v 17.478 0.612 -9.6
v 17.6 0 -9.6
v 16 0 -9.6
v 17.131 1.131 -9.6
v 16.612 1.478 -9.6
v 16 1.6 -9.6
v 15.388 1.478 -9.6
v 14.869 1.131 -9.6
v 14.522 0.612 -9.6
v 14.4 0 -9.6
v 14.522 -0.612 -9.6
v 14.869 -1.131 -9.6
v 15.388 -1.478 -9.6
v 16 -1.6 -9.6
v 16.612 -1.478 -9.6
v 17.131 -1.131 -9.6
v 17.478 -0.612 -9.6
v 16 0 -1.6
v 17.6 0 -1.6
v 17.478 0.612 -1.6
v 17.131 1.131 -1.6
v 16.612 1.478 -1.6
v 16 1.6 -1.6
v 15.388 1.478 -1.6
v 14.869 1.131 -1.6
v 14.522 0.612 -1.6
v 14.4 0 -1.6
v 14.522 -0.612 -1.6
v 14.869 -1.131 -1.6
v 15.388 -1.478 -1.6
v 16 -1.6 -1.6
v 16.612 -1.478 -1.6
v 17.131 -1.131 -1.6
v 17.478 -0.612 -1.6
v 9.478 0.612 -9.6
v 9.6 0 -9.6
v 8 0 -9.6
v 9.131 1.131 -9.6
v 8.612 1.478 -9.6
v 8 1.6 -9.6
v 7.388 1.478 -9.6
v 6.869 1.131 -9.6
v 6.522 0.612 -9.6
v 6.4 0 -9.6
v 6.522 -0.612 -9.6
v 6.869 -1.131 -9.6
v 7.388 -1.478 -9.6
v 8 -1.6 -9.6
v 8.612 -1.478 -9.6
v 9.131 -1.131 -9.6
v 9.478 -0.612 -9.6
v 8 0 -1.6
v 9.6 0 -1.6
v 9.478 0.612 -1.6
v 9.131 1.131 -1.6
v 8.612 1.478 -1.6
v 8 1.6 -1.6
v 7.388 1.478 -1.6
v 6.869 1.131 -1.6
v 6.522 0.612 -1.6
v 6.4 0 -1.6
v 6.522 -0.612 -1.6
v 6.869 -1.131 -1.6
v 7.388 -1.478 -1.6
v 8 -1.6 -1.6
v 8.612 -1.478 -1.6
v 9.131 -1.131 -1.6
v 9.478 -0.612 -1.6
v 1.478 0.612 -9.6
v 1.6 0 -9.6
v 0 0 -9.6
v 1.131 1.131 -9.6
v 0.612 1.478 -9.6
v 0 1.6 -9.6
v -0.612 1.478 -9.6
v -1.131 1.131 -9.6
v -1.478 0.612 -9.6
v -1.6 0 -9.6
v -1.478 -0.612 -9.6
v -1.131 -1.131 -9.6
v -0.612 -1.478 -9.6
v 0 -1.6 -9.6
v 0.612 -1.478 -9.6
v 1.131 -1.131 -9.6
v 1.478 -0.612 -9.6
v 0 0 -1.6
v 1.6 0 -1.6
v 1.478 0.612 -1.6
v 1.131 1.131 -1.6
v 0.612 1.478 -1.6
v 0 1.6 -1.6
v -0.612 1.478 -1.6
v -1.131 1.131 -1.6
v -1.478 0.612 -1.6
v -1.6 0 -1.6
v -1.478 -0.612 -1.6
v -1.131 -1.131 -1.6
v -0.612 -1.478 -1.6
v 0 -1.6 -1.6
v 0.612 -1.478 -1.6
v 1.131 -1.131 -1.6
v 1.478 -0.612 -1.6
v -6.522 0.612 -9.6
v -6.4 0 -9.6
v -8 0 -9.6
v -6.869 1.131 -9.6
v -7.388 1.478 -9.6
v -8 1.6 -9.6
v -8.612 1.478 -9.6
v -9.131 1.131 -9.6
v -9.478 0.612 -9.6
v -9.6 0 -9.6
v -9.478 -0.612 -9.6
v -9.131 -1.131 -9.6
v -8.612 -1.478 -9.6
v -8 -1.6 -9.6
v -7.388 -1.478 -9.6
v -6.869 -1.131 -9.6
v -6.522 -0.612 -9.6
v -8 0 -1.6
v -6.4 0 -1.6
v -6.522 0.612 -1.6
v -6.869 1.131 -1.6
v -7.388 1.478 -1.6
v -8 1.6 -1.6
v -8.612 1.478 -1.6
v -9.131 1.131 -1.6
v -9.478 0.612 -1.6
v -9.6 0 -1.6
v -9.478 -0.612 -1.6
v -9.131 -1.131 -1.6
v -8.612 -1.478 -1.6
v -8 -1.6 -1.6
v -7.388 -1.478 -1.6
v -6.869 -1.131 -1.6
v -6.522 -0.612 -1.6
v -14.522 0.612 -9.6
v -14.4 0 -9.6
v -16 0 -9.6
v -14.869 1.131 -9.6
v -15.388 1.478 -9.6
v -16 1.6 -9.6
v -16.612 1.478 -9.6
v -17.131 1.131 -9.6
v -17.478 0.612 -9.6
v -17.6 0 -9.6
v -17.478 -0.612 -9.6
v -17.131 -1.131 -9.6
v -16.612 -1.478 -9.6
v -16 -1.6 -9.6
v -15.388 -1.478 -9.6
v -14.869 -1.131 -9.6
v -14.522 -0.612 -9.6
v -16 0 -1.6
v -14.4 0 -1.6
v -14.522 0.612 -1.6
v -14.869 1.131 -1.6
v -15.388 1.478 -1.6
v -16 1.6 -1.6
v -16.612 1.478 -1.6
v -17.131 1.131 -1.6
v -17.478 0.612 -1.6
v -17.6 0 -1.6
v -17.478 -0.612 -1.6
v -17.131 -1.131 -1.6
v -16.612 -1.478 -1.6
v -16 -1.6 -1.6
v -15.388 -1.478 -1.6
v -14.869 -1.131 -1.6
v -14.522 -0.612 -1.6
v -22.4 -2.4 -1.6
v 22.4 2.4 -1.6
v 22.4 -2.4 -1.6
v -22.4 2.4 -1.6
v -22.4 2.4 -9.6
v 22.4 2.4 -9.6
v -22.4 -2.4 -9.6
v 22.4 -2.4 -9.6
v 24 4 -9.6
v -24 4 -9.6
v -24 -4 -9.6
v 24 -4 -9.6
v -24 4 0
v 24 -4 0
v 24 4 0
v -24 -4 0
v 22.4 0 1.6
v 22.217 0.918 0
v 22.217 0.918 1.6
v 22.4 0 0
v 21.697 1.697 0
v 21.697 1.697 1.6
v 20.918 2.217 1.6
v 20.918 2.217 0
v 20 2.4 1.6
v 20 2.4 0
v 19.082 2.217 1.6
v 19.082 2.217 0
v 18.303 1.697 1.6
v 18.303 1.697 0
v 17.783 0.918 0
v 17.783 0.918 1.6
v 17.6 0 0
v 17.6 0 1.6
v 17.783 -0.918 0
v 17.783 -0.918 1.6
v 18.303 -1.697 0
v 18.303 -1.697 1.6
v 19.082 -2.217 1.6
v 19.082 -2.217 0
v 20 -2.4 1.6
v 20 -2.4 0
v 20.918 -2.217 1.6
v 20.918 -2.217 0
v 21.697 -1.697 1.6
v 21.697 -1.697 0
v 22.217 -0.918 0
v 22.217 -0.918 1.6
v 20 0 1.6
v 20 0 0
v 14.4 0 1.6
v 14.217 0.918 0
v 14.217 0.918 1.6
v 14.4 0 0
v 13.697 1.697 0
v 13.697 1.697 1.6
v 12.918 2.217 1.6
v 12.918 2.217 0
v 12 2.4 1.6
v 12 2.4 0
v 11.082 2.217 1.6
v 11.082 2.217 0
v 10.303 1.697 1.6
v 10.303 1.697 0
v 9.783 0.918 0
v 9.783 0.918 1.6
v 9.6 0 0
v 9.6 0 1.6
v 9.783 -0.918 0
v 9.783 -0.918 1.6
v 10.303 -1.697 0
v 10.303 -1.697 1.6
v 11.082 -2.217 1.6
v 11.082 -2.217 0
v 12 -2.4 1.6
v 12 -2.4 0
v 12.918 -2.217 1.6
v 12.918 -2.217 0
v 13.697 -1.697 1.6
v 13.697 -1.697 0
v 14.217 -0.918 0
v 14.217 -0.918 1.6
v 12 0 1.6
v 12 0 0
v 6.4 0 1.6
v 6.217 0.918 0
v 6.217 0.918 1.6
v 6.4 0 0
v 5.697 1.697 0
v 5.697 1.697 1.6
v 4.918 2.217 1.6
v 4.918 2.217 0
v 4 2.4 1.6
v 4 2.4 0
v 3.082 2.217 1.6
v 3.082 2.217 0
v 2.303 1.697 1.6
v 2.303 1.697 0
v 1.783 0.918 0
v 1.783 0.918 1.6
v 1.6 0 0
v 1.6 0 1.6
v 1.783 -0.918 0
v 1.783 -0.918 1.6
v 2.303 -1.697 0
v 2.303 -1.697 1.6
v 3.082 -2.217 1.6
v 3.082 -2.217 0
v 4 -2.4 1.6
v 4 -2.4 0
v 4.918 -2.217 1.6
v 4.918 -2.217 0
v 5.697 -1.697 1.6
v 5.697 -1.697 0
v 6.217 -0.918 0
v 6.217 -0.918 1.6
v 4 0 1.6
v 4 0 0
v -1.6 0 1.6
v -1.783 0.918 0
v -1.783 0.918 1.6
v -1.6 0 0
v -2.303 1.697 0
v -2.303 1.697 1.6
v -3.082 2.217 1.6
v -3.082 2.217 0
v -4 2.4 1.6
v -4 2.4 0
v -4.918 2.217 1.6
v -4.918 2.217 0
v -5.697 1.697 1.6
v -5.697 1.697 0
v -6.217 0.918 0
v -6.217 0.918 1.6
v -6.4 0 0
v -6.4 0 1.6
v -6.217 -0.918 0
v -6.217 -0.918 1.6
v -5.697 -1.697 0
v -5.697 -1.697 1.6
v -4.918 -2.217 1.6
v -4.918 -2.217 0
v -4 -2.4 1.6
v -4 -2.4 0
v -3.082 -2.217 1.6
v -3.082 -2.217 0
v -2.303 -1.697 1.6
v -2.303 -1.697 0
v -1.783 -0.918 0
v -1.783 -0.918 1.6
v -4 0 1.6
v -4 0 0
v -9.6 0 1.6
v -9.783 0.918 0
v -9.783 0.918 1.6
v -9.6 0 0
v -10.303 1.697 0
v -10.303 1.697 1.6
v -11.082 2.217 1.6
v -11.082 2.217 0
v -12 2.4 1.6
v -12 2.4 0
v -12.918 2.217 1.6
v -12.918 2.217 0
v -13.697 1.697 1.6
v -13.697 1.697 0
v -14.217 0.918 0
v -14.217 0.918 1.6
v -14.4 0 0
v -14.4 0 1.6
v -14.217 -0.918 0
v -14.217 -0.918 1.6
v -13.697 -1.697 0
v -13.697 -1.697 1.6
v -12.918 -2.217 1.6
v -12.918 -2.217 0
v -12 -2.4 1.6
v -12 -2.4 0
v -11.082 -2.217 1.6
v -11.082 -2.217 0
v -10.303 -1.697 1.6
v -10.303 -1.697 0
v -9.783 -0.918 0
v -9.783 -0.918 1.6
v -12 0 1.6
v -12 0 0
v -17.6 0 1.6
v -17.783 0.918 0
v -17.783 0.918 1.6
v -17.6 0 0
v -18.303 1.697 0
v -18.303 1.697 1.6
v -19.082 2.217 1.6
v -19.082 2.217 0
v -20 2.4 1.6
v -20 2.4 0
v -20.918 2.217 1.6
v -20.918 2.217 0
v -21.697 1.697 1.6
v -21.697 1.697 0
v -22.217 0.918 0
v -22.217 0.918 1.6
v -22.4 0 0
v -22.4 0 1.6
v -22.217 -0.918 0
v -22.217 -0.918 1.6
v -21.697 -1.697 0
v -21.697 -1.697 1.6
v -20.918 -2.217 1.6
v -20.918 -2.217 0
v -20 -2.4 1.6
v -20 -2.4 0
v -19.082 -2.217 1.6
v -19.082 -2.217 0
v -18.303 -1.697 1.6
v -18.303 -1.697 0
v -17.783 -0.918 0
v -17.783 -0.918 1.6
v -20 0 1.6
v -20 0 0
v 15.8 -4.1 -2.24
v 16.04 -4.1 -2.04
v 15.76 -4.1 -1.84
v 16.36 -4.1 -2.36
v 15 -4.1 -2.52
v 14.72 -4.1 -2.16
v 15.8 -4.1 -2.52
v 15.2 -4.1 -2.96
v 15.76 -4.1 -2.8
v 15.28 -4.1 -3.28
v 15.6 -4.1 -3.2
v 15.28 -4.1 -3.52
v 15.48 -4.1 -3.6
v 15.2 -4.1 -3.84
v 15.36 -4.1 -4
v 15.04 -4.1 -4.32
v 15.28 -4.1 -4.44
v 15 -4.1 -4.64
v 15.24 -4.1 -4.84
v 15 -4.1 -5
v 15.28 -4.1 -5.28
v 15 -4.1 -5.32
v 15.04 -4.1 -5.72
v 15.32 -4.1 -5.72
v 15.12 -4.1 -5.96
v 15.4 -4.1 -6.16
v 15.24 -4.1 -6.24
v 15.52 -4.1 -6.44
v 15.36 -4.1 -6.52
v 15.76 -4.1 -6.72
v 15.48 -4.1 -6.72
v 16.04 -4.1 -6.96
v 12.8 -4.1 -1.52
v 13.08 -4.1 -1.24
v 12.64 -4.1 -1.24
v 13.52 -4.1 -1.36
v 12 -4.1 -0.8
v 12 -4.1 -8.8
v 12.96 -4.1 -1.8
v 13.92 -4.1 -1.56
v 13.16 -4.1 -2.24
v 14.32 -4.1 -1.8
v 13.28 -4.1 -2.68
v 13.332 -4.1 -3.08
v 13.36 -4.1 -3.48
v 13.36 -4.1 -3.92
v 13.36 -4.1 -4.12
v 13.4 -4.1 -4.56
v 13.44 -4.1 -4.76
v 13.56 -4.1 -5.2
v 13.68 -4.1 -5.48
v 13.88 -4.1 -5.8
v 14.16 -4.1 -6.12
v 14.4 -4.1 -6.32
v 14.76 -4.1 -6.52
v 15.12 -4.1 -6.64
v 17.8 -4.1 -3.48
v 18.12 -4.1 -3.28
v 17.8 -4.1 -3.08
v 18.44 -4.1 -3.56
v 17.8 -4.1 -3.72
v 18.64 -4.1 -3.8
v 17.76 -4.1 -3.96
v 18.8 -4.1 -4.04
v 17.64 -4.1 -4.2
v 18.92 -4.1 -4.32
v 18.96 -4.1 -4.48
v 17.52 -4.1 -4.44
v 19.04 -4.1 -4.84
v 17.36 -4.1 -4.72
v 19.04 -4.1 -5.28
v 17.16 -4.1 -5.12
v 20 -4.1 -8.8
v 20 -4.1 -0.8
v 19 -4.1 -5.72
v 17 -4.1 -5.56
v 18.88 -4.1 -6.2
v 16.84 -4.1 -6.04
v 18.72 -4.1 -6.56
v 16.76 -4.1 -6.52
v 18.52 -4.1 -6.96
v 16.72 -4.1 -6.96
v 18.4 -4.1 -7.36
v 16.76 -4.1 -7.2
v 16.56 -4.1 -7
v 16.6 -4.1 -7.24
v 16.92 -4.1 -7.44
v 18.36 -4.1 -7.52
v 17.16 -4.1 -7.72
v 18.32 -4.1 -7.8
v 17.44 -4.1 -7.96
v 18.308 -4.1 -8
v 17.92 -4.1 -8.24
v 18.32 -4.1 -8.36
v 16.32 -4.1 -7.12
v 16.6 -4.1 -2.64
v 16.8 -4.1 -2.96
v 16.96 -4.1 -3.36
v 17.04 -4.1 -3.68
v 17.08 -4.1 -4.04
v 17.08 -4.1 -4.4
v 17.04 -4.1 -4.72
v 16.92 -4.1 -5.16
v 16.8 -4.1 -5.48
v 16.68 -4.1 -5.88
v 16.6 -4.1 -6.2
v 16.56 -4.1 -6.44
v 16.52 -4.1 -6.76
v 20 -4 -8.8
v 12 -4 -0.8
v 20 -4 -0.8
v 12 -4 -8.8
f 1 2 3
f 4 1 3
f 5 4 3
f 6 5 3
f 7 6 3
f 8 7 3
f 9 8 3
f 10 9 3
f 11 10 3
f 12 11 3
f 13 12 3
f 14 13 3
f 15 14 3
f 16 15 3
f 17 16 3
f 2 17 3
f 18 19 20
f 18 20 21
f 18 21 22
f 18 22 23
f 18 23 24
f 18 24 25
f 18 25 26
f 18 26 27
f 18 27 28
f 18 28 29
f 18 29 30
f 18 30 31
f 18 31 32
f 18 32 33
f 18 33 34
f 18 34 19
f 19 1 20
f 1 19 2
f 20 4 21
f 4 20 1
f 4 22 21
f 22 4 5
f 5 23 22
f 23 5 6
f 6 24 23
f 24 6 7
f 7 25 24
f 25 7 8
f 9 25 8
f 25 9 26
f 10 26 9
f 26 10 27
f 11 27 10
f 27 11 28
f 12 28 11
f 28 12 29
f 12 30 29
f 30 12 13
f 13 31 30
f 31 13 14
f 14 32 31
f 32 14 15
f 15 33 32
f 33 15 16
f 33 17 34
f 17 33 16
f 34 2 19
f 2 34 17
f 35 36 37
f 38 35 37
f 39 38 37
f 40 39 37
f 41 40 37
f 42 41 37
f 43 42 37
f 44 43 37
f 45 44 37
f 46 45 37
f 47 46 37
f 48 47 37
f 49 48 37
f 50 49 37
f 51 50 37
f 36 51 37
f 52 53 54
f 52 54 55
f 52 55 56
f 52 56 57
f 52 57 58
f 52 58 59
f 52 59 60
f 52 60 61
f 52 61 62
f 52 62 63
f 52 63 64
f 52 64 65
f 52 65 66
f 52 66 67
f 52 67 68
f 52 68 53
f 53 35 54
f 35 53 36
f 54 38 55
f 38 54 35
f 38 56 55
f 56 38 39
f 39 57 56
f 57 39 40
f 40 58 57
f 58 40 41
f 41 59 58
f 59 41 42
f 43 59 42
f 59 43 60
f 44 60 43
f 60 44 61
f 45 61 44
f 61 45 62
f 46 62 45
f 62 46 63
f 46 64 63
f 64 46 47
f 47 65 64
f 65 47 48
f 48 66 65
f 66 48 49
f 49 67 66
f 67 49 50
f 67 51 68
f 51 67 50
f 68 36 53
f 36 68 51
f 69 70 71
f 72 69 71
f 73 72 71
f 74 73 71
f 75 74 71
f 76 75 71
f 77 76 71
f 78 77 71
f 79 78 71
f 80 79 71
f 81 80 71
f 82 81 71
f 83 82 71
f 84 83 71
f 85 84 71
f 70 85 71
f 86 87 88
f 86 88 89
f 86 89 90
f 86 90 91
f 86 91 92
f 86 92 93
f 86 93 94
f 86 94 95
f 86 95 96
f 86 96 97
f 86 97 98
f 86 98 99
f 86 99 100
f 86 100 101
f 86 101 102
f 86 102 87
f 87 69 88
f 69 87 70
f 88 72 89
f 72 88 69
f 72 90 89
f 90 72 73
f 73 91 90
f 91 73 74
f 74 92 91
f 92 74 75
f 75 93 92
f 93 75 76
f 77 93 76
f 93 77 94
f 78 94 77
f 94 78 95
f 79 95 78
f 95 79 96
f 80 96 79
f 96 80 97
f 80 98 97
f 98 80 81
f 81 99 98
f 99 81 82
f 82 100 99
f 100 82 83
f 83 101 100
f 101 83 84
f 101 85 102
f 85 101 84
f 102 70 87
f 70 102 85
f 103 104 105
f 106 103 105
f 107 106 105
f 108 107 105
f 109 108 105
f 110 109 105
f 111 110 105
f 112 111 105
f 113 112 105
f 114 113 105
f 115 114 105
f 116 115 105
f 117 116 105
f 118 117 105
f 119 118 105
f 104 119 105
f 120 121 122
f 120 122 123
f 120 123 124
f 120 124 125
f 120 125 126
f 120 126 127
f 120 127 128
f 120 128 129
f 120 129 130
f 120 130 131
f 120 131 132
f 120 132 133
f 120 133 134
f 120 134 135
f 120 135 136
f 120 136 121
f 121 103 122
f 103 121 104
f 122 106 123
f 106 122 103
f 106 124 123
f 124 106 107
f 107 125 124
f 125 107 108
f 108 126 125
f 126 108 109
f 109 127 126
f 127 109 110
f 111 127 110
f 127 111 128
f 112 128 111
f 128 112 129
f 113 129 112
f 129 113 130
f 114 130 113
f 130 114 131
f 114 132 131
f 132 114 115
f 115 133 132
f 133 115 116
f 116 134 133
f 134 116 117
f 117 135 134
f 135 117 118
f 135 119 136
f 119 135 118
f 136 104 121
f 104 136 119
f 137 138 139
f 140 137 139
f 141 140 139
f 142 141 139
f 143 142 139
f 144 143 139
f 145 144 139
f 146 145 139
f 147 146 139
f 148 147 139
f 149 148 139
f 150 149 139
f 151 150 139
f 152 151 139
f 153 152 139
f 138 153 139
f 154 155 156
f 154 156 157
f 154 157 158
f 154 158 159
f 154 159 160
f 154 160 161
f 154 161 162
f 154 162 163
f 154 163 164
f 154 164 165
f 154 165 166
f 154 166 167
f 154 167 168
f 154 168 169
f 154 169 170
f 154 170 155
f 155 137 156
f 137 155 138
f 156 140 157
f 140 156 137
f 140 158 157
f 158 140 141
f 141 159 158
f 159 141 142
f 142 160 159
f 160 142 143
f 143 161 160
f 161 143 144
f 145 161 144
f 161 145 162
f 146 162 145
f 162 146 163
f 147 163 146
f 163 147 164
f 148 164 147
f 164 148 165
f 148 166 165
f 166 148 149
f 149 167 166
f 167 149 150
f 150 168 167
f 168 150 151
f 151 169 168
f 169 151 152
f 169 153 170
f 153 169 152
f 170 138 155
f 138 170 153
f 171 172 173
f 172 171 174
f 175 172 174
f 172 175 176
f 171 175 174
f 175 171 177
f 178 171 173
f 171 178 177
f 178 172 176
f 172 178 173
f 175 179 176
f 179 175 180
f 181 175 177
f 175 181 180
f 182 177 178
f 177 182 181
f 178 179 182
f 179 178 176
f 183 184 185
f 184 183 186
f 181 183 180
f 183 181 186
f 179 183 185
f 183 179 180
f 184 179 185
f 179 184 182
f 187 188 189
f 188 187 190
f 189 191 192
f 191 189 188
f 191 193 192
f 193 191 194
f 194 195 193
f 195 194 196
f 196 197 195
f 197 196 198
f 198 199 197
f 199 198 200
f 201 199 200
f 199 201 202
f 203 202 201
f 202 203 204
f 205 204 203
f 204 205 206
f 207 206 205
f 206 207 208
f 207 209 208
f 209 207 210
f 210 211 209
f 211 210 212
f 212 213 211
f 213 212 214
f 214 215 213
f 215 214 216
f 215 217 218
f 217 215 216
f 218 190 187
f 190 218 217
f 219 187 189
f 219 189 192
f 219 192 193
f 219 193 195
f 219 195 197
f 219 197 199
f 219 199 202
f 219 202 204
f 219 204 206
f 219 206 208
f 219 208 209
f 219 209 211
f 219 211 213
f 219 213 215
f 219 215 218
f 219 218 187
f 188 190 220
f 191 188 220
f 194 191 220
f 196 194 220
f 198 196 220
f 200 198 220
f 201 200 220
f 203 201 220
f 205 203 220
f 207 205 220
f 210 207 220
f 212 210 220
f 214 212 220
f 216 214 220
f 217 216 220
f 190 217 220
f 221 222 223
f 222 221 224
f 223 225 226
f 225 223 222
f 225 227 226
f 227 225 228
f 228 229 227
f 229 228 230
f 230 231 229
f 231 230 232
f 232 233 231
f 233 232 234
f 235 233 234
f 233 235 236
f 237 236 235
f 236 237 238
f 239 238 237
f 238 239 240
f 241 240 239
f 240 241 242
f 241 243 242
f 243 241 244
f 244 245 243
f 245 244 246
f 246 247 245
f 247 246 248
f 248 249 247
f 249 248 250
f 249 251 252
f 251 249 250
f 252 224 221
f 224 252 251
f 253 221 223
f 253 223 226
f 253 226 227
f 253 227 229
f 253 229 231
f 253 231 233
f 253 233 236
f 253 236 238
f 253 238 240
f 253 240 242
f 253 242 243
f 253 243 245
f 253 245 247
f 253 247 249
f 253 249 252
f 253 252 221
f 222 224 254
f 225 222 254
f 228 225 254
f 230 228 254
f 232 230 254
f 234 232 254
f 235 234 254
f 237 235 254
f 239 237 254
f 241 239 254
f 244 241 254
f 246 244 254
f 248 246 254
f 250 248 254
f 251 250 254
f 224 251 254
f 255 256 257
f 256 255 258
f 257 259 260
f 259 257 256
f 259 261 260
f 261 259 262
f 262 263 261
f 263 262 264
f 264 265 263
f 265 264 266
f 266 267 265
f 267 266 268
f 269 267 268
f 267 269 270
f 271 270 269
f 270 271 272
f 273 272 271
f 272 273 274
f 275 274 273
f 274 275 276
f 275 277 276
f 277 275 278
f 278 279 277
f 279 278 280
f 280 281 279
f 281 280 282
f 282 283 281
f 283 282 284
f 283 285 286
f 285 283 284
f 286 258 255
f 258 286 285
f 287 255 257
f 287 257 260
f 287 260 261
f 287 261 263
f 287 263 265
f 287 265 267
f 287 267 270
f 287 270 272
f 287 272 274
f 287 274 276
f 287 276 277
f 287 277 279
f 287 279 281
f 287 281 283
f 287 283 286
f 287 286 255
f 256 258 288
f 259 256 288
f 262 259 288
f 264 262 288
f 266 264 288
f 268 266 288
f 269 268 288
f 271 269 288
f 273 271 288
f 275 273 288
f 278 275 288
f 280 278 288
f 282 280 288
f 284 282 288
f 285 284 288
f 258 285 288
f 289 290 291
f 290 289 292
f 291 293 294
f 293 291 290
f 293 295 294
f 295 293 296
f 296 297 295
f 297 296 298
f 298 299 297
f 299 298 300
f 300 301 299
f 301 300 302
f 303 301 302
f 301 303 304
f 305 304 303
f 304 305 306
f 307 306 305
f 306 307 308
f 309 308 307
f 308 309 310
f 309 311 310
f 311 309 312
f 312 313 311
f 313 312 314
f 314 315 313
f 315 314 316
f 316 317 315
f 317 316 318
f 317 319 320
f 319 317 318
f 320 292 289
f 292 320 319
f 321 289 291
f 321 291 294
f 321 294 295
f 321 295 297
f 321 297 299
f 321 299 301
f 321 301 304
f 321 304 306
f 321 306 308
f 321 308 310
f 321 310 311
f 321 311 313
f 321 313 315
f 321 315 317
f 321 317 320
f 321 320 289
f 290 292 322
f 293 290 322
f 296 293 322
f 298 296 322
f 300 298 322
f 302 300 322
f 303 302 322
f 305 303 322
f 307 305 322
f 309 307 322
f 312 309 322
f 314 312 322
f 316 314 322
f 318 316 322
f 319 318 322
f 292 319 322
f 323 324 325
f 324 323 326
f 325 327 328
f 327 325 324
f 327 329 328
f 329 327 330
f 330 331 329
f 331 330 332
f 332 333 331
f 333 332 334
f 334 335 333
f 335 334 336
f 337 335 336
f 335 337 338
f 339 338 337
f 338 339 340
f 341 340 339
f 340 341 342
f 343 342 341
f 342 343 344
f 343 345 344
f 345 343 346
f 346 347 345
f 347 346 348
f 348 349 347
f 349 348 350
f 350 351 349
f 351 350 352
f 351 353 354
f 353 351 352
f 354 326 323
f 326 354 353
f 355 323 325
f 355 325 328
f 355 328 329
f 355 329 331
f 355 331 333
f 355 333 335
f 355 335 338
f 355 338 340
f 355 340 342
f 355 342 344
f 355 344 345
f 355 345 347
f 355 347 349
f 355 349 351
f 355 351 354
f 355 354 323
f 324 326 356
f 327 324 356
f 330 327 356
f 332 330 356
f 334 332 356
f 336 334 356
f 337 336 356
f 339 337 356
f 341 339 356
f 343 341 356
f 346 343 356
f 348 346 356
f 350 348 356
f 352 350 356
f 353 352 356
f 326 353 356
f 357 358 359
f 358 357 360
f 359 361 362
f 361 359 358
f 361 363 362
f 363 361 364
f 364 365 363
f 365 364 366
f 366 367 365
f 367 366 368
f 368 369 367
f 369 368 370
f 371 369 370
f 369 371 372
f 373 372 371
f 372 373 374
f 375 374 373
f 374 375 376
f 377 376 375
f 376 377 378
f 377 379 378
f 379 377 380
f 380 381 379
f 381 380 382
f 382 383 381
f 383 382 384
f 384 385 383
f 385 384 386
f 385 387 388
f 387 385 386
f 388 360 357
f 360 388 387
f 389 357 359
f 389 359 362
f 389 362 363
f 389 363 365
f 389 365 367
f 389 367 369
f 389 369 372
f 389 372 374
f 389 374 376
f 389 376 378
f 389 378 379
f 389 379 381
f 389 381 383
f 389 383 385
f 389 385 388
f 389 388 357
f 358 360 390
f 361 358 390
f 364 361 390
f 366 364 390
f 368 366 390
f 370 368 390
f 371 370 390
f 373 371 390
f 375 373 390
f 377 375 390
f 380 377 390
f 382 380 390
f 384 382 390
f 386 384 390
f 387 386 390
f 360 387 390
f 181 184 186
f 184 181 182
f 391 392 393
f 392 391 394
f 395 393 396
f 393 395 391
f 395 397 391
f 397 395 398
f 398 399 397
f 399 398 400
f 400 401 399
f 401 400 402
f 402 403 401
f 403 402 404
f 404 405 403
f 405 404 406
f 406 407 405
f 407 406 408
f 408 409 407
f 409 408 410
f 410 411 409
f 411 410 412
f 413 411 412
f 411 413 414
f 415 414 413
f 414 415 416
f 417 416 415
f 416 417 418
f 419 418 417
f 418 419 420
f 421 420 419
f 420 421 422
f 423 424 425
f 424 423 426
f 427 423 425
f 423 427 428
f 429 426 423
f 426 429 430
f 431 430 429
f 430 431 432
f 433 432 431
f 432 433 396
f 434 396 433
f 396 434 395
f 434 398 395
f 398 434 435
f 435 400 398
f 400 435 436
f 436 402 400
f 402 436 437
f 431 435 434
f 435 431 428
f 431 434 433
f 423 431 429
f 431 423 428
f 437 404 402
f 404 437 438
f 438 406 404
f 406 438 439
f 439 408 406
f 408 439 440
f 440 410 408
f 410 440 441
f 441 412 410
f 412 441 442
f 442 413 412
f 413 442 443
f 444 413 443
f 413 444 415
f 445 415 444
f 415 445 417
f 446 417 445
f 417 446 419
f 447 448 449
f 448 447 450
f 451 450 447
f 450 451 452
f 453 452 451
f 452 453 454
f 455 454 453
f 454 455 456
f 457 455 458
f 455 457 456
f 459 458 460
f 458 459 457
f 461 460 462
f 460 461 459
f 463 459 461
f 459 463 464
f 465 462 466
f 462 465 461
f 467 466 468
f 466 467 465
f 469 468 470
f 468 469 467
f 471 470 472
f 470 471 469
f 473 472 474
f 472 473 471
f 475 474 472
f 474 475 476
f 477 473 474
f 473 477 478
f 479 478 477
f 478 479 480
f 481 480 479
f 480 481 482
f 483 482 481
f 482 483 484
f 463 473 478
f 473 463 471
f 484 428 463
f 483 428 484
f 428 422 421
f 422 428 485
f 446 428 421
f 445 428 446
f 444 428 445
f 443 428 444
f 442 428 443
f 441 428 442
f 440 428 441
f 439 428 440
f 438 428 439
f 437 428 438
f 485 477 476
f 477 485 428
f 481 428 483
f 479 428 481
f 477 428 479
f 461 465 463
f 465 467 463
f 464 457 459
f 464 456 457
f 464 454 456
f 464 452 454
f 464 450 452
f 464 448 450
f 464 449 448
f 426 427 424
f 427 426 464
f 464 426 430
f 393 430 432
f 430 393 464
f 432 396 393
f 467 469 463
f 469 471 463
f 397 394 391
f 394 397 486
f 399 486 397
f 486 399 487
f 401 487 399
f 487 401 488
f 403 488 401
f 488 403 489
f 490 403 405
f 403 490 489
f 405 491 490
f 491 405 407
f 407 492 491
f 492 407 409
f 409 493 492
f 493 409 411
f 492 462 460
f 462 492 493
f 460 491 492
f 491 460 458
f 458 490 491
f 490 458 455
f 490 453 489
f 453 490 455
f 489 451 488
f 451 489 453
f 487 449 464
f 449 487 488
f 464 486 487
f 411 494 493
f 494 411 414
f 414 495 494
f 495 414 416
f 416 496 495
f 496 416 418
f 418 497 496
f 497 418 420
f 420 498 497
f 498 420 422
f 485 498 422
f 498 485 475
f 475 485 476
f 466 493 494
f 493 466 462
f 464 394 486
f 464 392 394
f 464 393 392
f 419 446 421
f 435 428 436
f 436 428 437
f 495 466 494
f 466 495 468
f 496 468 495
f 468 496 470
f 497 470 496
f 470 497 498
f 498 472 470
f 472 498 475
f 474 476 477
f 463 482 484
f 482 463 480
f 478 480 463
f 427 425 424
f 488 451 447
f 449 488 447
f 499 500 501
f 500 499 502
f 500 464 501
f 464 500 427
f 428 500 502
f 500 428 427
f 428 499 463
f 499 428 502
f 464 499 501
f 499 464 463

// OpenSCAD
// file: ../p/4-4edge.scad
use <../lib.scad>
function ldraw_lib__4_4edge() = [
// 0 Circle 1.0
// 0 Name: 4-4edge.dat
// 0 Author: James Jessiman
// 0 !LDRAW_ORG Primitive UPDATE 2017-01
// 0 !LICENSE Licensed under CC BY 2.0 and CC BY 4.0 : see CAreadme.txt
// 
// 0 BFC CERTIFY CCW
  [0,"BFC","CERTIFY"],
  [0,"BFC","CCW"],
// 
// 0 !HISTORY 1998-12-15 [PTadmin] Official Update 1998-10
// 0 !HISTORY 2005-12-28 [PTadmin] Official Update 2005-01
// 0 !HISTORY 2007-06-24 [PTadmin] Header formatted for Contributor Agreement
// 0 !HISTORY 2008-07-01 [PTadmin] Official Update 2008-01
// 0 !HISTORY 2017-01-15 [Steffen] BFCed
// 0 !HISTORY 2017-12-30 [PTadmin] Official Update 2017-01
// 
// 
// 2 24 1 0 0 0.9239 0 0.3827
  [2,24,1,0,0,0.9239,0,0.3827],
// 2 24 0.9239 0 0.3827 0.7071 0 0.7071
  [2,24,0.9239,0,0.3827,0.7071,0,0.7071],
// 2 24 0.7071 0 0.7071 0.3827 0 0.9239
  [2,24,0.7071,0,0.7071,0.3827,0,0.9239],
// 2 24 0.3827 0 0.9239 0 0 1
  [2,24,0.3827,0,0.9239,0,0,1],
// 2 24 0 0 1 -0.3827 0 0.9239
  [2,24,0,0,1,-0.3827,0,0.9239],
// 2 24 -0.3827 0 0.9239 -0.7071 0 0.7071
  [2,24,-0.3827,0,0.9239,-0.7071,0,0.7071],
// 2 24 -0.7071 0 0.7071 -0.9239 0 0.3827
  [2,24,-0.7071,0,0.7071,-0.9239,0,0.3827],
// 2 24 -0.9239 0 0.3827 -1 0 -0
  [2,24,-0.9239,0,0.3827,-1,0,-0],
// 2 24 -1 0 -0 -0.9239 0 -0.3827
  [2,24,-1,0,-0,-0.9239,0,-0.3827],
// 2 24 -0.9239 0 -0.3827 -0.7071 0 -0.7071
  [2,24,-0.9239,0,-0.3827,-0.7071,0,-0.7071],
// 2 24 -0.7071 0 -0.7071 -0.3827 0 -0.9239
  [2,24,-0.7071,0,-0.7071,-0.3827,0,-0.9239],
// 2 24 -0.3827 0 -0.9239 0 0 -1
  [2,24,-0.3827,0,-0.9239,0,0,-1],
// 2 24 0 0 -1 0.3827 0 -0.9239
  [2,24,0,0,-1,0.3827,0,-0.9239],
// 2 24 0.3827 0 -0.9239 0.7071 0 -0.7071
  [2,24,0.3827,0,-0.9239,0.7071,0,-0.7071],
// 2 24 0.7071 0 -0.7071 0.9239 0 -0.3827
  [2,24,0.7071,0,-0.7071,0.9239,0,-0.3827],
// 2 24 0.9239 0 -0.3827 1 0 0
  [2,24,0.9239,0,-0.3827,1,0,0],
];
module ldraw_lib__4_4edge(step=0, col=false, unit=2/5, alt=false, line=0.2, solid=!$preview)
    makepoly(ldraw_lib__4_4edge(), step=step, col=col, unit=unit, alt=alt, line=line, solid=solid);
ldraw_lib__4_4edge(line=0.2);
// file: ../p/4-4disc.scad
use <../lib.scad>
function ldraw_lib__4_4disc() = [
// 0 Disc 1.0
// 0 Name: 4-4disc.dat
// 0 Author: James Jessiman
// 0 !LDRAW_ORG Primitive UPDATE 2002-02
// 0 !LICENSE Licensed under CC BY 2.0 and CC BY 4.0 : see CAreadme.txt
// 
// 0 BFC CERTIFY CCW
  [0,"BFC","CERTIFY"],
  [0,"BFC","CCW"],
// 
// 0 !HISTORY 1998-12-15 [PTadmin] Official Update 1998-10
// 0 !HISTORY 2002-03-23 [sbliss] Added BFC statement
// 0 !HISTORY 2002-04-25 [PTadmin] Official Update 2002-02
// 0 !HISTORY 2007-06-24 [PTadmin] Header formatted for Contributor Agreement
// 0 !HISTORY 2008-07-01 [PTadmin] Official Update 2008-01
// 
// 
// 3 16 0 0 0 1 0 0 0.9239 0 0.3827
  [3,16,0,0,0,1,0,0,0.9239,0,0.3827],
// 3 16 0 0 0 0.9239 0 0.3827 0.7071 0 0.7071
  [3,16,0,0,0,0.9239,0,0.3827,0.7071,0,0.7071],
// 3 16 0 0 0 0.7071 0 0.7071 0.3827 0 0.9239
  [3,16,0,0,0,0.7071,0,0.7071,0.3827,0,0.9239],
// 3 16 0 0 0 0.3827 0 0.9239 0 0 1
  [3,16,0,0,0,0.3827,0,0.9239,0,0,1],
// 3 16 0 0 0 0 0 1 -0.3827 0 0.9239
  [3,16,0,0,0,0,0,1,-0.3827,0,0.9239],
// 3 16 0 0 0 -0.3827 0 0.9239 -0.7071 0 0.7071
  [3,16,0,0,0,-0.3827,0,0.9239,-0.7071,0,0.7071],
// 3 16 0 0 0 -0.7071 0 0.7071 -0.9239 0 0.3827
  [3,16,0,0,0,-0.7071,0,0.7071,-0.9239,0,0.3827],
// 3 16 0 0 0 -0.9239 0 0.3827 -1 0 -0
  [3,16,0,0,0,-0.9239,0,0.3827,-1,0,-0],
// 3 16 0 0 0 -1 0 -0 -0.9239 0 -0.3827
  [3,16,0,0,0,-1,0,-0,-0.9239,0,-0.3827],
// 3 16 0 0 0 -0.9239 0 -0.3827 -0.7071 0 -0.7071
  [3,16,0,0,0,-0.9239,0,-0.3827,-0.7071,0,-0.7071],
// 3 16 0 0 0 -0.7071 0 -0.7071 -0.3827 0 -0.9239
  [3,16,0,0,0,-0.7071,0,-0.7071,-0.3827,0,-0.9239],
// 3 16 0 0 0 -0.3827 0 -0.9239 0 0 -1
  [3,16,0,0,0,-0.3827,0,-0.9239,0,0,-1],
// 3 16 0 0 0 0 0 -1 0.3827 0 -0.9239
  [3,16,0,0,0,0,0,-1,0.3827,0,-0.9239],
// 3 16 0 0 0 0.3827 0 -0.9239 0.7071 0 -0.7071
  [3,16,0,0,0,0.3827,0,-0.9239,0.7071,0,-0.7071],
// 3 16 0 0 0 0.7071 0 -0.7071 0.9239 0 -0.3827
  [3,16,0,0,0,0.7071,0,-0.7071,0.9239,0,-0.3827],
// 3 16 0 0 0 0.9239 0 -0.3827 1 0 0
  [3,16,0,0,0,0.9239,0,-0.3827,1,0,0],
// 0
];
module ldraw_lib__4_4disc(step=0, col=false, unit=2/5, alt=false, line=0.2, solid=!$preview)
    makepoly(ldraw_lib__4_4disc(), step=step, col=col, unit=unit, alt=alt, line=line, solid=solid);
ldraw_lib__4_4disc(line=0.2);
// file: ../p/4-4cyli.scad
use <../lib.scad>
$fa=1; $fs=0.2;
function ldraw_lib__4_4cyli(realsolid=false) = [
// 0 Cylinder 1.0
// 0 Name: 4-4cyli.dat
// 0 Author: James Jessiman
// 0 !LDRAW_ORG Primitive UPDATE 2005-01
// 0 !LICENSE Licensed under CC BY 2.0 and CC BY 4.0 : see CAreadme.txt
// 
// 0 BFC CERTIFY CCW
  [0,"BFC","CERTIFY"],
  [0,"BFC","CCW"],
// 
// 0 !HISTORY 1998-12-15 [PTadmin] Official Update 1998-10
// 0 !HISTORY 2002-03-23 [sbliss] Added BFC statement; merged headers from files in distributions LDraw 0.27 and Complete.
// 0 !HISTORY 2002-04-25 [PTadmin] Official Update 2002-02
// 0 !HISTORY 2004-12-14 [guyvivan] BFC CCW
// 0 !HISTORY 2005-12-28 [PTadmin] Official Update 2005-01
// 0 !HISTORY 2007-06-24 [PTadmin] Header formatted for Contributor Agreement
// 0 !HISTORY 2008-07-01 [PTadmin] Official Update 2008-01
// 
// 
// 4 16 1 1 0 0.9239 1 0.3827 0.9239 0 0.3827 1 0 0
  [4,16,1,1,0,0.9239,1,0.3827,0.9239,0,0.3827,1,0,0],
// 5 24 1 0 0 1 1 0 0.9239 0 0.3827 0.9239 0 -0.3827
  [5,24,1,0,0,1,1,0,0.9239,0,0.3827,0.9239,0,-0.3827],
// 4 16 0.9239 1 0.3827 0.7071 1 0.7071 0.7071 0 0.7071 0.9239 0 0.3827
  [4,16,0.9239,1,0.3827,0.7071,1,0.7071,0.7071,0,0.7071,0.9239,0,0.3827],
// 5 24 0.9239 0 0.3827 0.9239 1 0.3827 0.7071 0 0.7071 1 0 0
  [5,24,0.9239,0,0.3827,0.9239,1,0.3827,0.7071,0,0.7071,1,0,0],
// 4 16 0.7071 1 0.7071 0.3827 1 0.9239 0.3827 0 0.9239 0.7071 0 0.7071
  [4,16,0.7071,1,0.7071,0.3827,1,0.9239,0.3827,0,0.9239,0.7071,0,0.7071],
// 5 24 0.7071 0 0.7071 0.7071 1 0.7071 0.3827 0 0.9239 0.9239 0 0.3827
  [5,24,0.7071,0,0.7071,0.7071,1,0.7071,0.3827,0,0.9239,0.9239,0,0.3827],
// 4 16 0.3827 1 0.9239 0 1 1 0 0 1 0.3827 0 0.9239
  [4,16,0.3827,1,0.9239,0,1,1,0,0,1,0.3827,0,0.9239],
// 5 24 0.3827 0 0.9239 0.3827 1 0.9239 0 0 1 0.7071 0 0.7071
  [5,24,0.3827,0,0.9239,0.3827,1,0.9239,0,0,1,0.7071,0,0.7071],
// 4 16 0 1 1 -0.3827 1 0.9239 -0.3827 0 0.9239 0 0 1
  [4,16,0,1,1,-0.3827,1,0.9239,-0.3827,0,0.9239,0,0,1],
// 5 24 0 0 1 0 1 1 -0.3827 0 0.9239 0.3827 0 0.9239
  [5,24,0,0,1,0,1,1,-0.3827,0,0.9239,0.3827,0,0.9239],
// 4 16 -0.3827 1 0.9239 -0.7071 1 0.7071 -0.7071 0 0.7071 -0.3827 0 0.9239
  [4,16,-0.3827,1,0.9239,-0.7071,1,0.7071,-0.7071,0,0.7071,-0.3827,0,0.9239],
// 5 24 -0.3827 0 0.9239 -0.3827 1 0.9239 -0.7071 0 0.7071 0 0 1
  [5,24,-0.3827,0,0.9239,-0.3827,1,0.9239,-0.7071,0,0.7071,0,0,1],
// 4 16 -0.7071 1 0.7071 -0.9239 1 0.3827 -0.9239 0 0.3827 -0.7071 0 0.7071
  [4,16,-0.7071,1,0.7071,-0.9239,1,0.3827,-0.9239,0,0.3827,-0.7071,0,0.7071],
// 5 24 -0.7071 0 0.7071 -0.7071 1 0.7071 -0.9239 0 0.3827 -0.3827 0 0.9239
  [5,24,-0.7071,0,0.7071,-0.7071,1,0.7071,-0.9239,0,0.3827,-0.3827,0,0.9239],
// 4 16 -0.9239 1 0.3827 -1 1 0 -1 0 0 -0.9239 0 0.3827
  [4,16,-0.9239,1,0.3827,-1,1,0,-1,0,0,-0.9239,0,0.3827],
// 5 24 -0.9239 0 0.3827 -0.9239 1 0.3827 -1 0 0 -0.7071 0 0.7071
  [5,24,-0.9239,0,0.3827,-0.9239,1,0.3827,-1,0,0,-0.7071,0,0.7071],
// 4 16 -1 1 0 -0.9239 1 -0.3827 -0.9239 0 -0.3827 -1 0 0
  [4,16,-1,1,0,-0.9239,1,-0.3827,-0.9239,0,-0.3827,-1,0,0],
// 5 24 -1 0 0 -1 1 0 -0.9239 0 -0.3827 -0.9239 0 0.3827
  [5,24,-1,0,0,-1,1,0,-0.9239,0,-0.3827,-0.9239,0,0.3827],
// 4 16 -0.9239 1 -0.3827 -0.7071 1 -0.7071 -0.7071 0 -0.7071 -0.9239 0 -0.3827
  [4,16,-0.9239,1,-0.3827,-0.7071,1,-0.7071,-0.7071,0,-0.7071,-0.9239,0,-0.3827],
// 5 24 -0.9239 0 -0.3827 -0.9239 1 -0.3827 -0.7071 0 -0.7071 -1 0 0
  [5,24,-0.9239,0,-0.3827,-0.9239,1,-0.3827,-0.7071,0,-0.7071,-1,0,0],
// 4 16 -0.7071 1 -0.7071 -0.3827 1 -0.9239 -0.3827 0 -0.9239 -0.7071 0 -0.7071
  [4,16,-0.7071,1,-0.7071,-0.3827,1,-0.9239,-0.3827,0,-0.9239,-0.7071,0,-0.7071],
// 5 24 -0.7071 0 -0.7071 -0.7071 1 -0.7071 -0.3827 0 -0.9239 -0.9239 0 -0.3827
  [5,24,-0.7071,0,-0.7071,-0.7071,1,-0.7071,-0.3827,0,-0.9239,-0.9239,0,-0.3827],
// 4 16 -0.3827 1 -0.9239 0 1 -1 0 0 -1 -0.3827 0 -0.9239
  [4,16,-0.3827,1,-0.9239,0,1,-1,0,0,-1,-0.3827,0,-0.9239],
// 5 24 -0.3827 0 -0.9239 -0.3827 1 -0.9239 0 0 -1 -0.7071 0 -0.7071
  [5,24,-0.3827,0,-0.9239,-0.3827,1,-0.9239,0,0,-1,-0.7071,0,-0.7071],
// 4 16 0 1 -1 0.3827 1 -0.9239 0.3827 0 -0.9239 0 0 -1
  [4,16,0,1,-1,0.3827,1,-0.9239,0.3827,0,-0.9239,0,0,-1],
// 5 24 0 0 -1 0 1 -1 0.3827 0 -0.9239 -0.3827 0 -0.9239
  [5,24,0,0,-1,0,1,-1,0.3827,0,-0.9239,-0.3827,0,-0.9239],
// 4 16 0.3827 1 -0.9239 0.7071 1 -0.7071 0.7071 0 -0.7071 0.3827 0 -0.9239
  [4,16,0.3827,1,-0.9239,0.7071,1,-0.7071,0.7071,0,-0.7071,0.3827,0,-0.9239],
// 5 24 0.3827 0 -0.9239 0.3827 1 -0.9239 0.7071 0 -0.7071 0 0 -1
  [5,24,0.3827,0,-0.9239,0.3827,1,-0.9239,0.7071,0,-0.7071,0,0,-1],
// 4 16 0.7071 1 -0.7071 0.9239 1 -0.3827 0.9239 0 -0.3827 0.7071 0 -0.7071
  [4,16,0.7071,1,-0.7071,0.9239,1,-0.3827,0.9239,0,-0.3827,0.7071,0,-0.7071],
// 5 24 0.7071 0 -0.7071 0.7071 1 -0.7071 0.9239 0 -0.3827 0.3827 0 -0.9239
  [5,24,0.7071,0,-0.7071,0.7071,1,-0.7071,0.9239,0,-0.3827,0.3827,0,-0.9239],
// 4 16 0.9239 1 -0.3827 1 1 0 1 0 0 0.9239 0 -0.3827
  [4,16,0.9239,1,-0.3827,1,1,0,1,0,0,0.9239,0,-0.3827],
// 5 24 0.9239 0 -0.3827 0.9239 1 -0.3827 1 0 0 0.7071 0 -0.7071
  [5,24,0.9239,0,-0.3827,0.9239,1,-0.3827,1,0,0,0.7071,0,-0.7071],
// 0
];
module ldraw_lib__4_4cyli(step=0, col=false, unit=2/5, alt=false, line=0.2, solid=!$preview)
    makepoly(ldraw_lib__4_4cyli(solid), step=step, col=col, unit=unit, alt=alt, line=line, solid=solid);
ldraw_lib__4_4cyli(line=0.2);
// file: ../p/stud3.scad
use <../lib.scad>
use <4-4cyli.scad>
use <4-4disc.scad>
use <4-4edge.scad>
function ldraw_lib__stud3() = [
// 0 Stud Tube Solid
// 0 Name: stud3.dat
// 0 Author: James Jessiman
// 0 !LDRAW_ORG Primitive UPDATE 2012-01
// 0 !LICENSE Licensed under CC BY 4.0 : see CAreadme.txt
// 
// 0 BFC CERTIFY CCW
  [0,"BFC","CERTIFY"],
  [0,"BFC","CCW"],
// 
// 0 !HISTORY 2002-04-04 [sbliss] Modified for BFC compliance
// 0 !HISTORY 2002-04-25 [PTadmin] Official Update 2002-02
// 0 !HISTORY 2007-06-24 [PTadmin] Header formatted for Contributor Agreement
// 0 !HISTORY 2008-07-01 [PTadmin] Official Update 2008-01
// 0 !HISTORY 2012-02-16 [Philo] Changed to CCW
// 0 !HISTORY 2012-03-30 [PTadmin] Official Update 2012-01
// 
// 
// 1 16 0 -4 0 4 0 0 0 1 0 0 0 4 4-4edge.dat
  [1,16,0,-4,0,4,0,0,0,1,0,0,0,4, ldraw_lib__4_4edge()],
// 1 16 0 0 0 4 0 0 0 1 0 0 0 4 4-4edge.dat
  [1,16,0,0,0,4,0,0,0,1,0,0,0,4, ldraw_lib__4_4edge()],
// 1 16 0 -4 0 4 0 0 0 1 0 0 0 4 4-4disc.dat
  [1,16,0,-4,0,4,0,0,0,1,0,0,0,4, ldraw_lib__4_4disc()],
  [-1,16,0,0,0,4,0,0,0,-1,0,0,0,4, ldraw_lib__4_4disc()],
// 1 16 0 -4 0 4 0 0 0 4 0 0 0 4 4-4cyli.dat
  [1,16,0,-4,0,4,0,0,0,4,0,0,0,4, ldraw_lib__4_4cyli()],
];
module ldraw_lib__stud3(step=0, col=false, unit=2/5, alt=false, line=0.2, solid=!$preview)
    makepoly(ldraw_lib__stud3(), step=step, col=col, unit=unit, alt=alt, line=line, solid=solid);
ldraw_lib__stud3(line=0.2);
// file: ../p/stud.scad
use <../lib.scad>
use <4-4cyli.scad>
use <4-4disc.scad>
use <4-4edge.scad>
function ldraw_lib__stud() = [
// 0 Stud
// 0 Name: stud.dat
// 0 Author: James Jessiman
// 0 !LDRAW_ORG Primitive UPDATE 2012-01
// 0 !LICENSE Licensed under CC BY 4.0 : see CAreadme.txt
// 
// 0 BFC CERTIFY CCW
  [0,"BFC","CERTIFY"],
  [0,"BFC","CCW"],
// 
// 0 !HISTORY 2002-04-04 [sbliss] Modified for BFC compliance
// 0 !HISTORY 2002-04-25 [PTadmin] Official Update 2002-02
// 0 !HISTORY 2007-06-24 [PTadmin] Header formatted for Contributor Agreement
// 0 !HISTORY 2008-07-01 [PTadmin] Official Update 2008-01
// 0 !HISTORY 2012-02-16 [Philo] Changed to CCW
// 0 !HISTORY 2012-03-30 [PTadmin] Official Update 2012-01
// 
// 
// 1 16 0 0 0 6 0 0 0 1 0 0 0 6 4-4edge.dat
  [1,16,0,0,0,6,0,0,0,1,0,0,0,6, ldraw_lib__4_4edge()],
// 1 16 0 -4 0 6 0 0 0 1 0 0 0 6 4-4edge.dat
  [1,16,0,-4,0,6,0,0,0,1,0,0,0,6, ldraw_lib__4_4edge()],
// 1 16 0 0 0 6 0 0 0 -4 0 0 0 6 4-4cyli.dat
  [1,16,0,0,0,6,0,0,0,-4,0,0,0,6, ldraw_lib__4_4cyli()],
// 1 16 0 -4 0 6 0 0 0 1 0 0 0 6 4-4disc.dat
  [1,16,0,-4,0,6,0,0,0,1,0,0,0,6, ldraw_lib__4_4disc()],
  [-1,16,0,0,0,6,0,0,0,-1,0,0,0,6, ldraw_lib__4_4disc()],
];
module ldraw_lib__stud(step=0, col=false, unit=2/5, alt=false, line=0.2, solid=!$preview)
    makepoly(ldraw_lib__stud(), step=step, col=col, unit=unit, alt=alt, line=line, solid=solid);
ldraw_lib__stud(line=0.2);
// file: ../p/box5.scad
use <../lib.scad>
function ldraw_lib__box5() = [
// 0 Box with 5 Faces and All Edges
// 0 Name: box5.dat
// 0 Author: James Jessiman
// 0 !LDRAW_ORG Primitive UPDATE 2012-01
// 0 !LICENSE Licensed under CC BY 2.0 and CC BY 4.0 : see CAreadme.txt
// 
// 0 BFC CERTIFY CCW
  [0,"BFC","CERTIFY"],
  [0,"BFC","CCW"],
// 
// 0 !HISTORY 2002-04-03 [sbliss] Modified for BFC compliance
// 0 !HISTORY 2002-04-25 [PTadmin] Official Update 2002-02
// 0 !HISTORY 2007-06-24 [PTadmin] Header formatted for Contributor Agreement
// 0 !HISTORY 2008-07-01 [PTadmin] Official Update 2008-01
// 0 !HISTORY 2012-02-16 [Philo] Changed to CCW
// 0 !HISTORY 2012-03-30 [PTadmin] Official Update 2012-01
// 
// 
// 2 24 1 1 1 -1 1 1
  [2,24,1,1,1,-1,1,1],
// 2 24 -1 1 1 -1 1 -1
  [2,24,-1,1,1,-1,1,-1],
// 2 24 -1 1 -1 1 1 -1
  [2,24,-1,1,-1,1,1,-1],
// 2 24 1 1 -1 1 1 1
  [2,24,1,1,-1,1,1,1],
// 2 24 1 0 1 -1 0 1
  [2,24,1,0,1,-1,0,1],
// 2 24 -1 0 1 -1 0 -1
  [2,24,-1,0,1,-1,0,-1],
// 2 24 -1 0 -1 1 0 -1
  [2,24,-1,0,-1,1,0,-1],
// 2 24 1 0 -1 1 0 1
  [2,24,1,0,-1,1,0,1],
// 2 24 1 0 1 1 1 1
  [2,24,1,0,1,1,1,1],
// 2 24 -1 0 1 -1 1 1
  [2,24,-1,0,1,-1,1,1],
// 2 24 1 0 -1 1 1 -1
  [2,24,1,0,-1,1,1,-1],
// 2 24 -1 0 -1 -1 1 -1
  [2,24,-1,0,-1,-1,1,-1],
// 4 16 -1 1 1 1 1 1 1 1 -1 -1 1 -1
  [4,16,-1,1,1,1,1,1,1,1,-1,-1,1,-1],
// 4 16 -1 1 1 -1 0 1 1 0 1 1 1 1
  [4,16,-1,1,1,-1,0,1,1,0,1,1,1,1],
// 4 16 -1 1 -1 -1 0 -1 -1 0 1 -1 1 1
  [4,16,-1,1,-1,-1,0,-1,-1,0,1,-1,1,1],
// 4 16 1 1 -1 1 0 -1 -1 0 -1 -1 1 -1
  [4,16,1,1,-1,1,0,-1,-1,0,-1,-1,1,-1],
// 4 16 1 1 1 1 0 1 1 0 -1 1 1 -1
  [4,16,1,1,1,1,0,1,1,0,-1,1,1,-1],
];
makepoly(ldraw_lib__box5(), line=0.2);
// file: ../p/box5-12.scad
use <../lib.scad>
function ldraw_lib__box5_12() = [
// 0 Box with 5 Faces without Any Edges
// 0 Name: box5-12.dat
// 0 Author: Chris Dee [cwdee]
// 0 !LDRAW_ORG Primitive UPDATE 2009-02
// 0 !LICENSE Licensed under CC BY 2.0 and CC BY 4.0 : see CAreadme.txt
// 
// 0 BFC CERTIFY CCW
  [0,"BFC","CERTIFY"],
  [0,"BFC","CCW"],
// 
// 0 !HISTORY 2009-09-03 [PTadmin] Official Update 2009-02
// 
// 
// 4 16 1 1 1 1 1 -1 -1 1 -1 -1 1 1
  [4,16,1,1,1,1,1,-1,-1,1,-1,-1,1,1],
// 4 16 -1 0 1 1 0 1 1 1 1 -1 1 1
  [4,16,-1,0,1,1,0,1,1,1,1,-1,1,1],
// 4 16 -1 0 -1 -1 0 1 -1 1 1 -1 1 -1
  [4,16,-1,0,-1,-1,0,1,-1,1,1,-1,1,-1],
// 4 16 1 0 -1 -1 0 -1 -1 1 -1 1 1 -1
  [4,16,1,0,-1,-1,0,-1,-1,1,-1,1,1,-1],
// 4 16 1 0 1 1 0 -1 1 1 -1 1 1 1
  [4,16,1,0,1,1,0,-1,1,1,-1,1,1,1],
// 0
];
module ldraw_lib__box5_12(step=0, col=false, unit=2/5, alt=false, line=0.2, solid=!$preview)
    makepoly(ldraw_lib__box5_12(), step=step, col=col, unit=unit, alt=alt, line=line, solid=solid);
ldraw_lib__box5_12(line=0.2);
// file: s/3009s01.scad
use <../../lib.scad>
use <../../p/box5.scad>
use <../../p/stud.scad>
use <../../p/stud3.scad>
$fa=1; $fs=0.2;
function ldraw_lib__s__3009s01(realsolid=false) = [
// 0 ~Brick  1 x  6 without Front Face
// 0 Name: s\3009s01.dat
// 0 Author: James Jessiman
// 0 !LDRAW_ORG Subpart UPDATE 2003-03
// 0 !LICENSE Licensed under CC BY 2.0 and CC BY 4.0 : see CAreadme.txt
// 
// 0 BFC CERTIFY CCW
  [0,"BFC","CERTIFY"],
  [0,"BFC","CCW"],
// 
// 0 !HISTORY 2002-05-07 {unknown} BFC Certification
// 0 !HISTORY 2003-07-03 [Steffen] Subfiled for patterning
// 0 !HISTORY 2003-12-19 [PTadmin] Official Update 2003-03
// 0 !HISTORY 2007-08-29 [PTadmin] Header formatted for Contributor Agreement
// 0 !HISTORY 2008-07-01 [PTadmin] Official Update 2008-01
// 
// 
// 1 16 40 4 0 1 0 0 0 -5 0 0 0 1 stud3.dat
  [1,16,40,4,0,1,0,0,0,-5,0,0,0,1, ldraw_lib__stud3(realsolid)],
// 1 16 20 4 0 1 0 0 0 -5 0 0 0 1 stud3.dat
  [1,16,20,4,0,1,0,0,0,-5,0,0,0,1, ldraw_lib__stud3(realsolid)],
// 1 16 0 4 0 1 0 0 0 -5 0 0 0 1 stud3.dat
  [1,16,0,4,0,1,0,0,0,-5,0,0,0,1, ldraw_lib__stud3(realsolid)],
// 1 16 -20 4 0 1 0 0 0 -5 0 0 0 1 stud3.dat
  [1,16,-20,4,0,1,0,0,0,-5,0,0,0,1, ldraw_lib__stud3(realsolid)],
// 1 16 -40 4 0 1 0 0 0 -5 0 0 0 1 stud3.dat
  [1,16,-40,4,0,1,0,0,0,-5,0,0,0,1, ldraw_lib__stud3(realsolid)],
// 0 BFC INVERTNEXT
  [0,"BFC","INVERTNEXT"],
// 1 16 0 24 0 56 0 0 0 -20 0 0 0 6 box5.dat
  [1,16,0,24,0,56,0,0,0,-20,0,0,0,6, ldraw_lib__box5(realsolid)],
// 4 16 60 24 10 56 24 6 -56 24 6 -60 24 10
  [4,16,60,24,10,56,24,6,-56,24,6,-60,24,10],
// 4 16 -60 24 10 -56 24 6 -56 24 -6 -60 24 -10
  [4,16,-60,24,10,-56,24,6,-56,24,-6,-60,24,-10],
// 4 16 -60 24 -10 -56 24 -6 56 24 -6 60 24 -10
  [4,16,-60,24,-10,-56,24,-6,56,24,-6,60,24,-10],
// 4 16 60 24 -10 56 24 -6 56 24 6 60 24 10
  [4,16,60,24,-10,56,24,-6,56,24,6,60,24,10],
// 2 24 60 0 10 -60 0 10
  [2,24,60,0,10,-60,0,10],
// 2 24 -60 0 10 -60 0 -10
  [2,24,-60,0,10,-60,0,-10],
// 2 24 -60 0 -10 60 0 -10
  [2,24,-60,0,-10,60,0,-10],
// 2 24 60 0 -10 60 0 10
  [2,24,60,0,-10,60,0,10],
// 2 24 60 24 10 -60 24 10
  [2,24,60,24,10,-60,24,10],
// 2 24 -60 24 10 -60 24 -10
  [2,24,-60,24,10,-60,24,-10],
// 2 24 -60 24 -10 60 24 -10
  [2,24,-60,24,-10,60,24,-10],
// 2 24 60 24 -10 60 24 10
  [2,24,60,24,-10,60,24,10],
// 2 24 60 24 10 60 0 10
  [2,24,60,24,10,60,0,10],
// 2 24 -60 24 10 -60 0 10
  [2,24,-60,24,10,-60,0,10],
// 2 24 60 24 -10 60 0 -10
  [2,24,60,24,-10,60,0,-10],
// 2 24 -60 24 -10 -60 0 -10
  [2,24,-60,24,-10,-60,0,-10],
// 4 16 -60 0 -10 60 0 -10 60 0 10 -60 0 10
  [4,16,-60,0,-10,60,0,-10,60,0,10,-60,0,10],
// 4 16 -60 0 10 -60 24 10 -60 24 -10 -60 0 -10
  [4,16,-60,0,10,-60,24,10,-60,24,-10,-60,0,-10],
// 4 16 60 0 10 60 24 10 -60 24 10 -60 0 10
  [4,16,60,0,10,60,24,10,-60,24,10,-60,0,10],
// 4 16 60 0 -10 60 24 -10 60 24 10 60 0 10
  [4,16,60,0,-10,60,24,-10,60,24,10,60,0,10],
// 1 16 50 0 0 1 0 0 0 1 0 0 0 1 stud.dat
  [1,16,50,0,0,1,0,0,0,1,0,0,0,1, ldraw_lib__stud(realsolid)],
// 1 16 30 0 0 1 0 0 0 1 0 0 0 1 stud.dat
  [1,16,30,0,0,1,0,0,0,1,0,0,0,1, ldraw_lib__stud(realsolid)],
// 1 16 10 0 0 1 0 0 0 1 0 0 0 1 stud.dat
  [1,16,10,0,0,1,0,0,0,1,0,0,0,1, ldraw_lib__stud(realsolid)],
// 1 16 -10 0 0 1 0 0 0 1 0 0 0 1 stud.dat
  [1,16,-10,0,0,1,0,0,0,1,0,0,0,1, ldraw_lib__stud(realsolid)],
// 1 16 -30 0 0 1 0 0 0 1 0 0 0 1 stud.dat
  [1,16,-30,0,0,1,0,0,0,1,0,0,0,1, ldraw_lib__stud(realsolid)],
// 1 16 -50 0 0 1 0 0 0 1 0 0 0 1 stud.dat
  [1,16,-50,0,0,1,0,0,0,1,0,0,0,1, ldraw_lib__stud(realsolid)],
// 0
];
module ldraw_lib__s__3009s01(step=0, col=false, unit=2/5, alt=false, line=0.2, solid=!$preview)
    makepoly(ldraw_lib__s__3009s01(solid), step=step, col=col, unit=unit, alt=alt, line=line, solid=solid);
ldraw_lib__s__3009s01(line=0.2);
// file: 004659a.scad
use <../lib.scad>
use <../p/box5-12.scad>
use <s/004659as01.scad>
function ldraw_lib__004659a() = [
// 0 Sticker  1 x  1 Fire Emblem
// 0 Name: 004659a.dat
// 0 Author: Alex Taylor [anathema]
// 0 !LDRAW_ORG Part UPDATE 2013-01
// 0 !LICENSE Licensed under CC BY 4.0 : see CAreadme.txt
// 
// 0 BFC CERTIFY CCW
  [0,"BFC","CERTIFY"],
  [0,"BFC","CCW"],
// 
// 0 !HISTORY 2013-03-17 [MagFors] Used box primitive
// 0 !HISTORY 2013-07-21 [PTadmin] Official Update 2013-01
// 
// 
// 1 16 0 -0.25 0 1 0 0 0 1 0 0 0 1 s\004659as01.dat
  [1,16,0,-0.25,0,1,0,0,0,1,0,0,0,1, ldraw_lib__s__004659as01()],
// 1 16 0 -0.25 0 10 0 0 0 0.25 0 0 0 10 box5-12.dat
  [1,16,0,-0.25,0,10,0,0,0,0.25,0,0,0,10, ldraw_lib__box5_12()],
];
module ldraw_lib__004659a(step=0, col=false, unit=2/5, alt=false, line=0.2, solid=!$preview)
    makepoly(ldraw_lib__004659a(), step=step, col=col, unit=unit, alt=alt, line=line, solid=solid);
ldraw_lib__004659a(line=0.2);
// file: 3009.scad
use <../lib.scad>
use <s/3009s01.scad>
function ldraw_lib__3009() = [
// 0 Brick  1 x  6
// 0 Name: 3009.dat
// 0 Author: James Jessiman
// 0 !LDRAW_ORG Part UPDATE 2003-03
// 0 !LICENSE Licensed under CC BY 4.0 : see CAreadme.txt
// 
// 0 BFC CERTIFY CCW
  [0,"BFC","CERTIFY"],
  [0,"BFC","CCW"],
// 
// 0 !HISTORY 2001-10-26 [PTadmin] Official Update 2001-01
// 0 !HISTORY 2002-05-07 {unknown} BFC Certification
// 0 !HISTORY 2002-06-11 [PTadmin] Official Update 2002-03
// 0 !HISTORY 2003-07-03 [Steffen] Subfiled for patterning
// 0 !HISTORY 2003-12-19 [PTadmin] Official Update 2003-03
// 0 !HISTORY 2007-06-06 [PTadmin] Header formatted for Contributor Agreement
// 0 !HISTORY 2008-07-01 [PTadmin] Official Update 2008-01
// 
// 
// 1 16 0 0 0 1 0 0 0 1 0 0 0 1 s\3009s01.dat
  [1,16,0,0,0,1,0,0,0,1,0,0,0,1, ldraw_lib__s__3009s01()],
// 4 16 -60 0 -10 -60 24 -10 60 24 -10 60 0 -10
  [4,16,-60,0,-10,-60,24,-10,60,24,-10,60,0,-10],
// 0
];
module ldraw_lib__3009(step=0, col=false, unit=2/5, alt=false, line=0.2, solid=!$preview)
    makepoly(ldraw_lib__3009(), step=step, col=col, unit=unit, alt=alt, line=line, solid=solid);
ldraw_lib__3009(line=0.2);
// file: 004452e.scad
use <../lib.scad>
use <004659a.scad>
function ldraw_lib__004452e() = [
// 0 =Sticker  1 x  1 Fire Emblem
// 0 Name: 004452e.dat
// 0 Author: Takeshi Takahashi [RainbowDolphin]
// 0 !LDRAW_ORG Part Alias UPDATE 2024-05
// 0 !LICENSE Licensed under CC BY 4.0 : see CAreadme.txt
// 
// 0 BFC CERTIFY CCW
  [0,"BFC","CERTIFY"],
  [0,"BFC","CCW"],
// 
// 0 !KEYWORDS Bricklink 374.1stk01, Brickowl 954932, Fire engine, Fire Station
// 0 !KEYWORDS Rebrickable 4452stk, Set 374-1
// 
// 0 !HISTORY 2024-06-30 [OrionP] Official Update 2024-05
// 
// 
// 0 // Alias of 004659a
// 1 16 0 0 0 1 0 0 0 1 0 0 0 1 004659a.dat
  [1,16,0,0,0,1,0,0,0,1,0,0,0,1, ldraw_lib__004659a()],
];
module ldraw_lib__004452e(step=0, col=false, unit=2/5, alt=false, line=0.2, solid=!$preview)
    makepoly(ldraw_lib__004452e(), step=step, col=col, unit=unit, alt=alt, line=line, solid=solid);
ldraw_lib__004452e(line=0.2);
// main file
use <../lib.scad>
use <004452e.scad>
use <3009.scad>
function ldraw_lib__3009d03() = [
// 0 Brick  1 x  8 with Fire Logo Right Sticker
// 0 Name: 3009d03.dat
// 0 Author: Takeshi Takahashi [RainbowDolphin]
// 0 !LDRAW_ORG Shortcut UPDATE 2024-05
// 0 !LICENSE Licensed under CC BY 4.0 : see CAreadme.txt
// 
// 0 BFC CERTIFY CCW
  [0,"BFC","CERTIFY"],
  [0,"BFC","CCW"],
// 
// 0 !CATEGORY Sticker Shortcut
// 0 !KEYWORDS Bricklink 3009pb043R, Fire engine, Set 374-1, Set 590-1
// 
// 0 !HISTORY 2024-06-30 [OrionP] Official Update 2024-05
// 
// 1 16 0 0 0 1 0 0 0 1 0 0 0 1 3009.dat
  [1,16,0,0,0,1,0,0,0,1,0,0,0,1, ldraw_lib__3009()],
// 1 16 40 12 -10 1 0 0 0 0 -1 0 1 0 004452e.dat
  [1,16,40,12,-10,1,0,0,0,0,-1,0,1,0, ldraw_lib__004452e()],
];
module ldraw_lib__3009d03(step=0, col=false, unit=2/5, alt=false, line=0.2, solid=!$preview)
    makepoly(ldraw_lib__3009d03(), step=step, col=col, unit=unit, alt=alt, line=line, solid=solid);
ldraw_lib__3009d03(line=0.2);
